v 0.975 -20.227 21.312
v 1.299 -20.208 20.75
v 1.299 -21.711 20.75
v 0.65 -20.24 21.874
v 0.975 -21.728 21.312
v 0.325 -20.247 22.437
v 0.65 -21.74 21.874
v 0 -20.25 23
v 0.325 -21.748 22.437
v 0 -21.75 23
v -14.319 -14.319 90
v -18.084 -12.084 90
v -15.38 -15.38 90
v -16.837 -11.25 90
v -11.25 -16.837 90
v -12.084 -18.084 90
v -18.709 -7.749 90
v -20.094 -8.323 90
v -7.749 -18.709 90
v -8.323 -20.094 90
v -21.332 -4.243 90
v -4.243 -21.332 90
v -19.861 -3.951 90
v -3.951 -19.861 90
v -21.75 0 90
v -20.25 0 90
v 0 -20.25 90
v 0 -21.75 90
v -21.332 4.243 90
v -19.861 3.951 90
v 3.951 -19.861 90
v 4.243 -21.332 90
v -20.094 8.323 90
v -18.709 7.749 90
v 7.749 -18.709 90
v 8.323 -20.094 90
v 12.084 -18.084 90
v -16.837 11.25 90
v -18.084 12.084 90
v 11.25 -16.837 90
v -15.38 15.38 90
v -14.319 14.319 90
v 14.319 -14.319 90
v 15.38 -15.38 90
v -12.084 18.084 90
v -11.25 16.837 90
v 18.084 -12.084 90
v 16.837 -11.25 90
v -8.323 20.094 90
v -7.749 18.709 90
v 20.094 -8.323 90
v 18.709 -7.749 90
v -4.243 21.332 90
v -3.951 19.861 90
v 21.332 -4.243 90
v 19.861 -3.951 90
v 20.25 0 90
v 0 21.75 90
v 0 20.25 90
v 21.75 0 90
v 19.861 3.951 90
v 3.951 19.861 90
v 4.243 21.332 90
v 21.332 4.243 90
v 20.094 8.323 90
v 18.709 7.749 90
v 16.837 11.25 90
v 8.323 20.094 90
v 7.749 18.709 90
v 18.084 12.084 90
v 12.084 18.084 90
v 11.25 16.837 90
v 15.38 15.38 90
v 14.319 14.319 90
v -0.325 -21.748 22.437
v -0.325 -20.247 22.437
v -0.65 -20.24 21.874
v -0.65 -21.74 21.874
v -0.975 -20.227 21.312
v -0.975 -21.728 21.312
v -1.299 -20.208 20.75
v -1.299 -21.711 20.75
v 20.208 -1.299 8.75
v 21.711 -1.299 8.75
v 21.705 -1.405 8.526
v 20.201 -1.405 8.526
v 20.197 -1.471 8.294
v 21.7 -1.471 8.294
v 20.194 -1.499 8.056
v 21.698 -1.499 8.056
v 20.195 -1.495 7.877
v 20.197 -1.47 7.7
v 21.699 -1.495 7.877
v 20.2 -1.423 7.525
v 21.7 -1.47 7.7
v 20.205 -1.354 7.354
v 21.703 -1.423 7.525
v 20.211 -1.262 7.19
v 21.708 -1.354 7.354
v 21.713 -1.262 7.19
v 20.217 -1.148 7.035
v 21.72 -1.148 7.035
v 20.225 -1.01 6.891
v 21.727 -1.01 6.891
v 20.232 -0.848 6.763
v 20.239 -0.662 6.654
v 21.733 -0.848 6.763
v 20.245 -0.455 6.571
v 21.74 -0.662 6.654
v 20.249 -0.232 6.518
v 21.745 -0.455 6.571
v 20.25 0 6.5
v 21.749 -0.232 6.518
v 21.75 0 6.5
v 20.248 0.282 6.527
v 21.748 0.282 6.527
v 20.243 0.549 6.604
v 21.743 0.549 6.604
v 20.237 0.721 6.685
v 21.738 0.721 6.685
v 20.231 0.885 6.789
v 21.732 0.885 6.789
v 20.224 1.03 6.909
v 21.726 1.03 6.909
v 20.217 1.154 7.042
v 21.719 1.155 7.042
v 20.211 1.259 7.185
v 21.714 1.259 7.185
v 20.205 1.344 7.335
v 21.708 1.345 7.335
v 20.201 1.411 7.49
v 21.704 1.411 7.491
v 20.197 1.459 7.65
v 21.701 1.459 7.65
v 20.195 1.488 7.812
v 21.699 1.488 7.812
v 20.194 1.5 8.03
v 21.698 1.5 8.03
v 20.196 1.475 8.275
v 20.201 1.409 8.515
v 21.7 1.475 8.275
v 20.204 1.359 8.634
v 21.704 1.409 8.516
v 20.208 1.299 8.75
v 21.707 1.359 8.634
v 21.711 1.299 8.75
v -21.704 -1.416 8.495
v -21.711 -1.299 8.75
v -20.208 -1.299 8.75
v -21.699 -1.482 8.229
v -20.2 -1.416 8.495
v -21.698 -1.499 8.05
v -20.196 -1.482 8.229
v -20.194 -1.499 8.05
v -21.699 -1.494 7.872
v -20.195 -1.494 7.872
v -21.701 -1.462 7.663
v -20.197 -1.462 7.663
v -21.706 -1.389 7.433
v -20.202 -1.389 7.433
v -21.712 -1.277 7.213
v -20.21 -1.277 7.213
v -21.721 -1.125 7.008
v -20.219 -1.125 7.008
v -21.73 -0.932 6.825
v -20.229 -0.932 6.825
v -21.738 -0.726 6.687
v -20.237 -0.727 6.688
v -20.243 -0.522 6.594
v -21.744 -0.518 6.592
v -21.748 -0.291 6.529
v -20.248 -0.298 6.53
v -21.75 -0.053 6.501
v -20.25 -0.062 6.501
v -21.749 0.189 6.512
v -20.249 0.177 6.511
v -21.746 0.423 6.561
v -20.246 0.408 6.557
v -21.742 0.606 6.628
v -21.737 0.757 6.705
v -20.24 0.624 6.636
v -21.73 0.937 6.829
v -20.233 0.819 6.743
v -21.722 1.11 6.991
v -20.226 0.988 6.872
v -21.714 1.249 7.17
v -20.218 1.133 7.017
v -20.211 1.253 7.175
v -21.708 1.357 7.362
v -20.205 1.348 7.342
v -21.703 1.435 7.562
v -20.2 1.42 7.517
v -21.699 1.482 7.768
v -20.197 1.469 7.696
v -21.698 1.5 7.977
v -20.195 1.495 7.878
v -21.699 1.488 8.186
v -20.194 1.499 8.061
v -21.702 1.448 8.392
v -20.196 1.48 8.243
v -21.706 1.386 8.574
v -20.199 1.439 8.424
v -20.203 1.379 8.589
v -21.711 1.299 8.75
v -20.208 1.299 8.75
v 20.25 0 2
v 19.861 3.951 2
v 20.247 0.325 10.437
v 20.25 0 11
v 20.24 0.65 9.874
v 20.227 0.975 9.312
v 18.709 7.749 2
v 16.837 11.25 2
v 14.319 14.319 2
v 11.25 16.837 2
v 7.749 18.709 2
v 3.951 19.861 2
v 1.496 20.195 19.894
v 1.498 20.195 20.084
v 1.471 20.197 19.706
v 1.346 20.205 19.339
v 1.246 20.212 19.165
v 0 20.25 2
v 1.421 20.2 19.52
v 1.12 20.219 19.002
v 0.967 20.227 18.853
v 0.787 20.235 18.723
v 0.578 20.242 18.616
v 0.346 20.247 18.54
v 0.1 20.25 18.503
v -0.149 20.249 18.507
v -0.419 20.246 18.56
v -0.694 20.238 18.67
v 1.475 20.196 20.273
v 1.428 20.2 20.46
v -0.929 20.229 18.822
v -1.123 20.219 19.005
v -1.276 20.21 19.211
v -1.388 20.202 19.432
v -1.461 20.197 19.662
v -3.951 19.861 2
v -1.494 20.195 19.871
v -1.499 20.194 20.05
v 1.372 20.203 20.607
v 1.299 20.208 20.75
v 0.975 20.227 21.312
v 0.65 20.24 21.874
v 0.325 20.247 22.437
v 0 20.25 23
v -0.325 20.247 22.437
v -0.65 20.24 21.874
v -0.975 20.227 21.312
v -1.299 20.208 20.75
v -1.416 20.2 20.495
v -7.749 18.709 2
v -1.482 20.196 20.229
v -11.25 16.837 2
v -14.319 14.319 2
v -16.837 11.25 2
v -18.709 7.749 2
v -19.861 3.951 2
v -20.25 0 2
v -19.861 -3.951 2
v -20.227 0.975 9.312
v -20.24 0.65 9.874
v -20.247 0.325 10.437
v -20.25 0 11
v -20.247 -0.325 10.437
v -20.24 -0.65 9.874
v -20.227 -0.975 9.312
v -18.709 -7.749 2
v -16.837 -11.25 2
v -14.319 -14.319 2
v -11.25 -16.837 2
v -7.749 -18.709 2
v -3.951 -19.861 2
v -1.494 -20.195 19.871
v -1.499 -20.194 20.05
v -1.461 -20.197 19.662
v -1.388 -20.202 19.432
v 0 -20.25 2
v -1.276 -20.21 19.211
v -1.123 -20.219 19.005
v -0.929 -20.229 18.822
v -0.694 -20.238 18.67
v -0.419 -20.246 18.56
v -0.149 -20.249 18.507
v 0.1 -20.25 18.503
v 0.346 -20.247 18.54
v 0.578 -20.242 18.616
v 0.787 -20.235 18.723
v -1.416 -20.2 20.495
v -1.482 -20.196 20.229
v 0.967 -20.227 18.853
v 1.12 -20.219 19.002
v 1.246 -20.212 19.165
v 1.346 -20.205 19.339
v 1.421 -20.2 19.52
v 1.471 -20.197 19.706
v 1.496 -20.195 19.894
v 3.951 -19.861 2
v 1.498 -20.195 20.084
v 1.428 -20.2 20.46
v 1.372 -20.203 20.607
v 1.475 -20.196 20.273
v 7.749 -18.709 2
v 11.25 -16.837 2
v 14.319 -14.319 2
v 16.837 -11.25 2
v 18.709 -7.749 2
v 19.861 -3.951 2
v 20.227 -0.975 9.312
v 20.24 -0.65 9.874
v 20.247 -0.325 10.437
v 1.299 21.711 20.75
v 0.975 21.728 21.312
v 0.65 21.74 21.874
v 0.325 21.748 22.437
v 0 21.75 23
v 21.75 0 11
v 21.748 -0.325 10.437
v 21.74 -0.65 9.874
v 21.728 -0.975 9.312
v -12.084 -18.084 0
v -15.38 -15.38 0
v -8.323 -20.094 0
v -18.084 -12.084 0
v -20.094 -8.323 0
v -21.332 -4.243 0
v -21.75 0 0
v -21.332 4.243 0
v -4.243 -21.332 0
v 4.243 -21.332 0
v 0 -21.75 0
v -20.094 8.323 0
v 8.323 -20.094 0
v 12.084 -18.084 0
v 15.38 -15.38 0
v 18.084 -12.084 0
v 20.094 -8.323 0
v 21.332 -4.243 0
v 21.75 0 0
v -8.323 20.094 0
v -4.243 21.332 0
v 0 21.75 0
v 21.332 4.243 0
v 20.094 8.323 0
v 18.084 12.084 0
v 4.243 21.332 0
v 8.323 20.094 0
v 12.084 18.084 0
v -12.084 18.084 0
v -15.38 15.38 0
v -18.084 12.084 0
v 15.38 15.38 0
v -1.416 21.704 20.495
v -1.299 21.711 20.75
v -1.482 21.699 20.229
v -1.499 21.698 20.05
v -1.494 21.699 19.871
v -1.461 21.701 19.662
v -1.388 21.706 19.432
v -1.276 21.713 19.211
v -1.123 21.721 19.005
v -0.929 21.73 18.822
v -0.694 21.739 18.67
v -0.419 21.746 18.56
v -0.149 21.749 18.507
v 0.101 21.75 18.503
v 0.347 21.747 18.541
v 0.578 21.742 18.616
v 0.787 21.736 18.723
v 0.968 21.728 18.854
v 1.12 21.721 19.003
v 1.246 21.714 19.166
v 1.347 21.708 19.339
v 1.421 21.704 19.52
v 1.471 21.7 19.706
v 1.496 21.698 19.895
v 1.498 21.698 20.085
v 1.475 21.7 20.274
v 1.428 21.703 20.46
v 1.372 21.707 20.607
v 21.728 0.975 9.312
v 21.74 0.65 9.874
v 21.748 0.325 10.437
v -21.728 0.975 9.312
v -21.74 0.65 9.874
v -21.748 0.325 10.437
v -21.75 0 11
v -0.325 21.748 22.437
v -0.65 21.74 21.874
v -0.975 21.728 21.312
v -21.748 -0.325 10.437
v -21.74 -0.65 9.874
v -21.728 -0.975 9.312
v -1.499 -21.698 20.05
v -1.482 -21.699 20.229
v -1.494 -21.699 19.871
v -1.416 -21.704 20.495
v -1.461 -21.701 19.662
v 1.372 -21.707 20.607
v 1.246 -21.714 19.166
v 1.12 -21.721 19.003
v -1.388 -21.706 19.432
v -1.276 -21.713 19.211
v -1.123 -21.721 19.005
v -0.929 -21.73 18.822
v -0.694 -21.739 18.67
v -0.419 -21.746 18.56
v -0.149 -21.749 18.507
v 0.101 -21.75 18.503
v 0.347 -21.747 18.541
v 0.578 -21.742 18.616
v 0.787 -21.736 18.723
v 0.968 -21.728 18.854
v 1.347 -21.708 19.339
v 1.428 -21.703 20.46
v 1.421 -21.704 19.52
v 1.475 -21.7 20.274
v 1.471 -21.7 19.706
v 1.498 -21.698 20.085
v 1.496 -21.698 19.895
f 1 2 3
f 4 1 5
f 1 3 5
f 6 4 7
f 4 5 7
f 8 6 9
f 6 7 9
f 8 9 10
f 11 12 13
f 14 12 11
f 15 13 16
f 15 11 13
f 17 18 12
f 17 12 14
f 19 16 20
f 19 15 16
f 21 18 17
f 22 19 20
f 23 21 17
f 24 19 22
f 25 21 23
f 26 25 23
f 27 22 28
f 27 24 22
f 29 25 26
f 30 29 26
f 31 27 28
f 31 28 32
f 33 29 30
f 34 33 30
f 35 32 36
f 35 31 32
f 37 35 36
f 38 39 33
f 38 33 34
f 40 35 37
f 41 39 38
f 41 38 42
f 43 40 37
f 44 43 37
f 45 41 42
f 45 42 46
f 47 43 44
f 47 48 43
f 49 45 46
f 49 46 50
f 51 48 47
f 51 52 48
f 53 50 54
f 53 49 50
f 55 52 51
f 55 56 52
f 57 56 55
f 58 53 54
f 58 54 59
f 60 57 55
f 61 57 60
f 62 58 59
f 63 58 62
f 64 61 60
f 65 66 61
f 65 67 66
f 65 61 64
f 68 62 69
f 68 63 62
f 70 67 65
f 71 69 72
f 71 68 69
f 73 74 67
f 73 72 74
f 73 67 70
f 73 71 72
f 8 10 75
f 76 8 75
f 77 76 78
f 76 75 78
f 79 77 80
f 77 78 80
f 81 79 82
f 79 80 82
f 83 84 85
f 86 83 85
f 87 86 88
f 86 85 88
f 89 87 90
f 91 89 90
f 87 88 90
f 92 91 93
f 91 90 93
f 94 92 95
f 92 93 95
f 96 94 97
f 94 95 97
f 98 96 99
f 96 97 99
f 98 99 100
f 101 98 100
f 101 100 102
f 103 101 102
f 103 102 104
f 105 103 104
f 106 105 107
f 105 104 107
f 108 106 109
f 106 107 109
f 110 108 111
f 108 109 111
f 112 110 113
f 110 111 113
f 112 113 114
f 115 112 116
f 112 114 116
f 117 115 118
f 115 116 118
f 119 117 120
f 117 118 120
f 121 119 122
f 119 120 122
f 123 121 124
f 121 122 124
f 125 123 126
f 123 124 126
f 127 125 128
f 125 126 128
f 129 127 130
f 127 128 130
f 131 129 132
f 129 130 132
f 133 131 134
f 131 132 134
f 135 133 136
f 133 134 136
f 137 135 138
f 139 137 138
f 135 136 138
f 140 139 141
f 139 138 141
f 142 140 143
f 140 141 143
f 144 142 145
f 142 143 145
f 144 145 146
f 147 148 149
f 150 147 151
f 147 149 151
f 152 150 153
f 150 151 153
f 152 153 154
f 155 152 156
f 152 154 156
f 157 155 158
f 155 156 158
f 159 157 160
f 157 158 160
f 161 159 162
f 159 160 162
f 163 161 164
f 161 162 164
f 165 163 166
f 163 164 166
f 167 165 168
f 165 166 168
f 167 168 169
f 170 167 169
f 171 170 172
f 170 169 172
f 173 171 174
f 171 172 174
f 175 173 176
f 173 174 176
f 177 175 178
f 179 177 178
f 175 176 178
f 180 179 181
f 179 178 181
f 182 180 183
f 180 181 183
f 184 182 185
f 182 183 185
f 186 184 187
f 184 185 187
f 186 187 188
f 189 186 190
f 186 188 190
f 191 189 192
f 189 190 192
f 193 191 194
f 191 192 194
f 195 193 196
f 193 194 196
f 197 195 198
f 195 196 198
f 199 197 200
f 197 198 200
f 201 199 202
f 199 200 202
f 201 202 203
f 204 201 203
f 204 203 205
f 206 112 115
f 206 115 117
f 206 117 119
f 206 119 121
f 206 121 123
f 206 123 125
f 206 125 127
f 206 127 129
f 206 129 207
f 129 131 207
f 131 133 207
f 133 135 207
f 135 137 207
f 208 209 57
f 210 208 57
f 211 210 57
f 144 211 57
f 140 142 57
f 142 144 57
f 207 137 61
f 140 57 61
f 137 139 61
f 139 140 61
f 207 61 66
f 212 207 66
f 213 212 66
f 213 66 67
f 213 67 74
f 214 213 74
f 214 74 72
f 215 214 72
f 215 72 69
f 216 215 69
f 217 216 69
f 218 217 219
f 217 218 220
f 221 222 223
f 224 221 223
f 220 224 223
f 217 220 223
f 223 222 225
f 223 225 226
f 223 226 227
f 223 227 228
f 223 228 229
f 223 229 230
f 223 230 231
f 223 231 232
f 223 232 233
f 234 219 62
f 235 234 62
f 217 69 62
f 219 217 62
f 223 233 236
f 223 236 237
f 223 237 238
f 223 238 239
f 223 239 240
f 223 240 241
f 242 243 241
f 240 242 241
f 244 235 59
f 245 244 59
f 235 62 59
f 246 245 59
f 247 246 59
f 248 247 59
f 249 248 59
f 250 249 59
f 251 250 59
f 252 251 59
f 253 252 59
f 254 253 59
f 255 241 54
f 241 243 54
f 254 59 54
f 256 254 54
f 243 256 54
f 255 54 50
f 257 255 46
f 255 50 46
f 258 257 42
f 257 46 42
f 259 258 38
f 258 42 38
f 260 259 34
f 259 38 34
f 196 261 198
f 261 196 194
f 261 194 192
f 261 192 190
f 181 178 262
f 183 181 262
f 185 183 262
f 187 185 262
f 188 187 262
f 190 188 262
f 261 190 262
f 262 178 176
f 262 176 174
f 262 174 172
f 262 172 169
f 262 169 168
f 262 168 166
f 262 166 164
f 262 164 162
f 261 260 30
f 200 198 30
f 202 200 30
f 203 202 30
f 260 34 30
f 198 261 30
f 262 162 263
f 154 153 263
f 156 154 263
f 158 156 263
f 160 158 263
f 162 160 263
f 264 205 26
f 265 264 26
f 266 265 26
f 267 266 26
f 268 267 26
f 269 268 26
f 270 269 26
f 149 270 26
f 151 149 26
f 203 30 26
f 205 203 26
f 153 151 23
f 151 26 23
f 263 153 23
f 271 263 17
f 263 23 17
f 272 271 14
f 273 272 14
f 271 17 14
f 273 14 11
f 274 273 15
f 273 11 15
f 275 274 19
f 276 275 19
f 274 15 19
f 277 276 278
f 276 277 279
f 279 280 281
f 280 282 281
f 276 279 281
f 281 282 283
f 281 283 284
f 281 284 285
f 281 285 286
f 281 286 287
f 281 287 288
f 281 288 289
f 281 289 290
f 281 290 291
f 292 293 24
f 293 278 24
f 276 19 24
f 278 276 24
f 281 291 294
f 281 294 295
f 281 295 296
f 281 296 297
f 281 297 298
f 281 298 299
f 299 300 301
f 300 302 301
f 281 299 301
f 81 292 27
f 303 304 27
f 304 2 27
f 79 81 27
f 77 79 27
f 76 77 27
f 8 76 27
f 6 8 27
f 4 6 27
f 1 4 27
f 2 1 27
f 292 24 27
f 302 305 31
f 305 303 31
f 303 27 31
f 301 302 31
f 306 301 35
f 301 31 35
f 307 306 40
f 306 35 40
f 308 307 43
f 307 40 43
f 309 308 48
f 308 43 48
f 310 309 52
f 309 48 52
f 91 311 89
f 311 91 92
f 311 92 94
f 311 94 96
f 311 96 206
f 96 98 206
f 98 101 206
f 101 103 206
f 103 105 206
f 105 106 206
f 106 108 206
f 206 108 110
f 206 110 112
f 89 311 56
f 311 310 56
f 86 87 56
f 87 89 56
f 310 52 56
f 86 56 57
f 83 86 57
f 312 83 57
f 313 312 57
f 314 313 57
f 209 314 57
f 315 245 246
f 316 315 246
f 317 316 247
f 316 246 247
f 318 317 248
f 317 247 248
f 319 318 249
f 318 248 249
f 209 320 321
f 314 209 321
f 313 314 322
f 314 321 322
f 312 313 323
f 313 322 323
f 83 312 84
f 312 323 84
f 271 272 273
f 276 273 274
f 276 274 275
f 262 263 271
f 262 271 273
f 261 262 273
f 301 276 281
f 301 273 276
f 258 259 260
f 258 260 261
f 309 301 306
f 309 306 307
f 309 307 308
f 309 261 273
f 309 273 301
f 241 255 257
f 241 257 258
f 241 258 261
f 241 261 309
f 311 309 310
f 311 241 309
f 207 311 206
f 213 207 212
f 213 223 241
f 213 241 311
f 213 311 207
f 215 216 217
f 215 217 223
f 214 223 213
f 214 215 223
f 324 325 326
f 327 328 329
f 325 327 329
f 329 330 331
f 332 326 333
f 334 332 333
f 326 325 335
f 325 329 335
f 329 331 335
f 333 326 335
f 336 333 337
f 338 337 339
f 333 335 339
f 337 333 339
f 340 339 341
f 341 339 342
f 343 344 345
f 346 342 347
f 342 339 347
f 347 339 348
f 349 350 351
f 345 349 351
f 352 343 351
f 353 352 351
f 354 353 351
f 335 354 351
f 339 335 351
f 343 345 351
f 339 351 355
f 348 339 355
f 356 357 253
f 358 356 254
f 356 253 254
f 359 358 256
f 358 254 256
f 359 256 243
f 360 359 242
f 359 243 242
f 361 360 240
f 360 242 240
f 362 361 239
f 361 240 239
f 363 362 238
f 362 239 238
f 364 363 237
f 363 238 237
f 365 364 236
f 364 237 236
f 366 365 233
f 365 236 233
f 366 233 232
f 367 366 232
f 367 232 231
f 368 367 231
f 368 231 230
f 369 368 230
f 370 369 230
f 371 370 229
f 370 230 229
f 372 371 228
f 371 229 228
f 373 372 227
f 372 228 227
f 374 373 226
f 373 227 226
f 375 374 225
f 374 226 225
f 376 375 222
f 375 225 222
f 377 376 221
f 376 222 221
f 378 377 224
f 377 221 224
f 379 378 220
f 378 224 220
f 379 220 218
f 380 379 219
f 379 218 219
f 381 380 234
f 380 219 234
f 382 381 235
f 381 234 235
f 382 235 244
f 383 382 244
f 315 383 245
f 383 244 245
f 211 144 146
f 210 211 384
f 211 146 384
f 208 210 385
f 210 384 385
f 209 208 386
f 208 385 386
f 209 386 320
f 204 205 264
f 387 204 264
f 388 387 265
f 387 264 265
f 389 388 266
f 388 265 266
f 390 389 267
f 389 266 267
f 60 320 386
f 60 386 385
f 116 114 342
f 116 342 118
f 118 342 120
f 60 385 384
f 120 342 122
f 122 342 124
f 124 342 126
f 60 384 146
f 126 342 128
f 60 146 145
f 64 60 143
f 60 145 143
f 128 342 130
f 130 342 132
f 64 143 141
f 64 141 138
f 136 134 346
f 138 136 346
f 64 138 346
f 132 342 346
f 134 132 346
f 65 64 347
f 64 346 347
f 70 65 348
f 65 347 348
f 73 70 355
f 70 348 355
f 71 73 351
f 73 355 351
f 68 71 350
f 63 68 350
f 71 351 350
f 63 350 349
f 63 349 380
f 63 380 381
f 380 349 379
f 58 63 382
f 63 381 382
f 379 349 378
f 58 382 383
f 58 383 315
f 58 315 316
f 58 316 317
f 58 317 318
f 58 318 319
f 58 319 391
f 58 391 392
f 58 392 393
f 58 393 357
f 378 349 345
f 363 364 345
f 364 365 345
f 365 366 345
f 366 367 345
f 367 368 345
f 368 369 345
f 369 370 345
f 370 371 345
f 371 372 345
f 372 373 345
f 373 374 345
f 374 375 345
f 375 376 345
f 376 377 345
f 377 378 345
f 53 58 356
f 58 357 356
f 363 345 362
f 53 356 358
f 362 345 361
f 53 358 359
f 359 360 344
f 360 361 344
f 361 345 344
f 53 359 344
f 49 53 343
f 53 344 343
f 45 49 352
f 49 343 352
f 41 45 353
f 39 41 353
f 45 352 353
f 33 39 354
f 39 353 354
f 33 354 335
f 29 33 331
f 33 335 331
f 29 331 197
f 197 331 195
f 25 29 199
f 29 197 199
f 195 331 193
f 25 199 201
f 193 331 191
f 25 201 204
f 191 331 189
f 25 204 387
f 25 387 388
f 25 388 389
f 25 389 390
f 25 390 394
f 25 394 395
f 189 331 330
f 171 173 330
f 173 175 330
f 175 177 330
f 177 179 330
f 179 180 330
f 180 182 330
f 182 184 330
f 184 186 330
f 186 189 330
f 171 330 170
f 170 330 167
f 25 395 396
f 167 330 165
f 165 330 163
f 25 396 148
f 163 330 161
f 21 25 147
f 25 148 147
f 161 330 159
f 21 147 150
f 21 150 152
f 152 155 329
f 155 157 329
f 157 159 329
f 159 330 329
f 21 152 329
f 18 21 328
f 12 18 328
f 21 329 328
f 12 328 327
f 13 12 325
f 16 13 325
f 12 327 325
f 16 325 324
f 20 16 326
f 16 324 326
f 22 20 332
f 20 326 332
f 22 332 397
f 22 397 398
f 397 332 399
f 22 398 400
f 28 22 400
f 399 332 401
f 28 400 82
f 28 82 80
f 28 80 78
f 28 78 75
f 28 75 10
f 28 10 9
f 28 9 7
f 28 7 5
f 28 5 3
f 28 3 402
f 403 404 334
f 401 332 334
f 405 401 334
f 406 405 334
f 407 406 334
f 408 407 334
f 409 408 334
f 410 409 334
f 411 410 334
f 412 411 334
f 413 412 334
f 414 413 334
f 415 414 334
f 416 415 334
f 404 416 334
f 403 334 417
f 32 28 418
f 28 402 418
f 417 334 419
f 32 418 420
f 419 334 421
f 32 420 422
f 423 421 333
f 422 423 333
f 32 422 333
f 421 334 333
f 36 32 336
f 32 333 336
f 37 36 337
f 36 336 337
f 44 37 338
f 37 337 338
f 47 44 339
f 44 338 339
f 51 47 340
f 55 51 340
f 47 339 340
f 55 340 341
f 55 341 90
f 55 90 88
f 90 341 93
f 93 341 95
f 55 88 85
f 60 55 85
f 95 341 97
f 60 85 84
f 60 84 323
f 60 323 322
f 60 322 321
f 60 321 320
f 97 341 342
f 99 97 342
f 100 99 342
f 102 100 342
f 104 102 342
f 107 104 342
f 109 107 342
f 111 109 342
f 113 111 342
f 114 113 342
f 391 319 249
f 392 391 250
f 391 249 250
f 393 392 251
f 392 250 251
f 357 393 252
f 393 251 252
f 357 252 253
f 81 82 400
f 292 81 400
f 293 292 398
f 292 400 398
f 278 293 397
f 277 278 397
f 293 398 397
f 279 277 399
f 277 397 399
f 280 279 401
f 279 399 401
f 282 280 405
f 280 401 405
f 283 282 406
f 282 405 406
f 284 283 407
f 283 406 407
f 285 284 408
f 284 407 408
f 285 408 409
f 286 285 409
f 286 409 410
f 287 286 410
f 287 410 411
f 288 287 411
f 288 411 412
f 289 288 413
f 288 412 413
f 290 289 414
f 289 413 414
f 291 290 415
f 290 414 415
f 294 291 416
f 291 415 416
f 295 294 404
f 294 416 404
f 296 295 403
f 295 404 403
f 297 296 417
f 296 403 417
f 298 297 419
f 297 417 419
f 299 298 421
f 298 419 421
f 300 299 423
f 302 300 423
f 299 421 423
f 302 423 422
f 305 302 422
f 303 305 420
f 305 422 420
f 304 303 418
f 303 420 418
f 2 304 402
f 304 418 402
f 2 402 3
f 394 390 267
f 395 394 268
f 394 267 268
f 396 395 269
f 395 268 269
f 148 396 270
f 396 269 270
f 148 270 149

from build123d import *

# Parameters (mm, degrees)
F0_R     = 21.75
F1_DEPTH = 90
F2_R     = 20.25
F3_DEPTH = 88
F5_DEPTH = 25
F7_DEPTH = 25


with BuildPart() as f1:
    # F0 (on Top) → F1 (new body)
    with BuildSketch(Plane.XY):
        Circle(F0_R)
    extrude(amount=F1_DEPTH)

    # F2 (on face) → F3 (cut)
    with BuildSketch(Plane.XY.offset(90)):
        Circle(F2_R)
    extrude(amount=-F3_DEPTH, mode=Mode.SUBTRACT)

    # F4 (on Right) → F5 (cut, symmetric)
    with BuildSketch(Plane.YZ):
        with BuildLine():
            Line((0, 11), (-1.299038, 8.75))
            ThreePointArc((-1.299038, 8.75), (0, 6.5), (1.299038, 8.75))
            Line((1.299038, 8.75), (0, 11))
        make_face()
    extrude(amount=F5_DEPTH, both=True, mode=Mode.SUBTRACT)

    # F6 (on Front) → F7 (cut, symmetric)
    with BuildSketch(Plane.XZ):
        with BuildLine():
            Line((0, 23), (-1.299038, 20.75))
            ThreePointArc((-1.299038, 20.75), (0, 18.5), (1.299038, 20.75))
            Line((1.299038, 20.75), (0, 23))
        make_face()
    extrude(amount=F7_DEPTH, both=True, mode=Mode.SUBTRACT)


solid = f1.part
